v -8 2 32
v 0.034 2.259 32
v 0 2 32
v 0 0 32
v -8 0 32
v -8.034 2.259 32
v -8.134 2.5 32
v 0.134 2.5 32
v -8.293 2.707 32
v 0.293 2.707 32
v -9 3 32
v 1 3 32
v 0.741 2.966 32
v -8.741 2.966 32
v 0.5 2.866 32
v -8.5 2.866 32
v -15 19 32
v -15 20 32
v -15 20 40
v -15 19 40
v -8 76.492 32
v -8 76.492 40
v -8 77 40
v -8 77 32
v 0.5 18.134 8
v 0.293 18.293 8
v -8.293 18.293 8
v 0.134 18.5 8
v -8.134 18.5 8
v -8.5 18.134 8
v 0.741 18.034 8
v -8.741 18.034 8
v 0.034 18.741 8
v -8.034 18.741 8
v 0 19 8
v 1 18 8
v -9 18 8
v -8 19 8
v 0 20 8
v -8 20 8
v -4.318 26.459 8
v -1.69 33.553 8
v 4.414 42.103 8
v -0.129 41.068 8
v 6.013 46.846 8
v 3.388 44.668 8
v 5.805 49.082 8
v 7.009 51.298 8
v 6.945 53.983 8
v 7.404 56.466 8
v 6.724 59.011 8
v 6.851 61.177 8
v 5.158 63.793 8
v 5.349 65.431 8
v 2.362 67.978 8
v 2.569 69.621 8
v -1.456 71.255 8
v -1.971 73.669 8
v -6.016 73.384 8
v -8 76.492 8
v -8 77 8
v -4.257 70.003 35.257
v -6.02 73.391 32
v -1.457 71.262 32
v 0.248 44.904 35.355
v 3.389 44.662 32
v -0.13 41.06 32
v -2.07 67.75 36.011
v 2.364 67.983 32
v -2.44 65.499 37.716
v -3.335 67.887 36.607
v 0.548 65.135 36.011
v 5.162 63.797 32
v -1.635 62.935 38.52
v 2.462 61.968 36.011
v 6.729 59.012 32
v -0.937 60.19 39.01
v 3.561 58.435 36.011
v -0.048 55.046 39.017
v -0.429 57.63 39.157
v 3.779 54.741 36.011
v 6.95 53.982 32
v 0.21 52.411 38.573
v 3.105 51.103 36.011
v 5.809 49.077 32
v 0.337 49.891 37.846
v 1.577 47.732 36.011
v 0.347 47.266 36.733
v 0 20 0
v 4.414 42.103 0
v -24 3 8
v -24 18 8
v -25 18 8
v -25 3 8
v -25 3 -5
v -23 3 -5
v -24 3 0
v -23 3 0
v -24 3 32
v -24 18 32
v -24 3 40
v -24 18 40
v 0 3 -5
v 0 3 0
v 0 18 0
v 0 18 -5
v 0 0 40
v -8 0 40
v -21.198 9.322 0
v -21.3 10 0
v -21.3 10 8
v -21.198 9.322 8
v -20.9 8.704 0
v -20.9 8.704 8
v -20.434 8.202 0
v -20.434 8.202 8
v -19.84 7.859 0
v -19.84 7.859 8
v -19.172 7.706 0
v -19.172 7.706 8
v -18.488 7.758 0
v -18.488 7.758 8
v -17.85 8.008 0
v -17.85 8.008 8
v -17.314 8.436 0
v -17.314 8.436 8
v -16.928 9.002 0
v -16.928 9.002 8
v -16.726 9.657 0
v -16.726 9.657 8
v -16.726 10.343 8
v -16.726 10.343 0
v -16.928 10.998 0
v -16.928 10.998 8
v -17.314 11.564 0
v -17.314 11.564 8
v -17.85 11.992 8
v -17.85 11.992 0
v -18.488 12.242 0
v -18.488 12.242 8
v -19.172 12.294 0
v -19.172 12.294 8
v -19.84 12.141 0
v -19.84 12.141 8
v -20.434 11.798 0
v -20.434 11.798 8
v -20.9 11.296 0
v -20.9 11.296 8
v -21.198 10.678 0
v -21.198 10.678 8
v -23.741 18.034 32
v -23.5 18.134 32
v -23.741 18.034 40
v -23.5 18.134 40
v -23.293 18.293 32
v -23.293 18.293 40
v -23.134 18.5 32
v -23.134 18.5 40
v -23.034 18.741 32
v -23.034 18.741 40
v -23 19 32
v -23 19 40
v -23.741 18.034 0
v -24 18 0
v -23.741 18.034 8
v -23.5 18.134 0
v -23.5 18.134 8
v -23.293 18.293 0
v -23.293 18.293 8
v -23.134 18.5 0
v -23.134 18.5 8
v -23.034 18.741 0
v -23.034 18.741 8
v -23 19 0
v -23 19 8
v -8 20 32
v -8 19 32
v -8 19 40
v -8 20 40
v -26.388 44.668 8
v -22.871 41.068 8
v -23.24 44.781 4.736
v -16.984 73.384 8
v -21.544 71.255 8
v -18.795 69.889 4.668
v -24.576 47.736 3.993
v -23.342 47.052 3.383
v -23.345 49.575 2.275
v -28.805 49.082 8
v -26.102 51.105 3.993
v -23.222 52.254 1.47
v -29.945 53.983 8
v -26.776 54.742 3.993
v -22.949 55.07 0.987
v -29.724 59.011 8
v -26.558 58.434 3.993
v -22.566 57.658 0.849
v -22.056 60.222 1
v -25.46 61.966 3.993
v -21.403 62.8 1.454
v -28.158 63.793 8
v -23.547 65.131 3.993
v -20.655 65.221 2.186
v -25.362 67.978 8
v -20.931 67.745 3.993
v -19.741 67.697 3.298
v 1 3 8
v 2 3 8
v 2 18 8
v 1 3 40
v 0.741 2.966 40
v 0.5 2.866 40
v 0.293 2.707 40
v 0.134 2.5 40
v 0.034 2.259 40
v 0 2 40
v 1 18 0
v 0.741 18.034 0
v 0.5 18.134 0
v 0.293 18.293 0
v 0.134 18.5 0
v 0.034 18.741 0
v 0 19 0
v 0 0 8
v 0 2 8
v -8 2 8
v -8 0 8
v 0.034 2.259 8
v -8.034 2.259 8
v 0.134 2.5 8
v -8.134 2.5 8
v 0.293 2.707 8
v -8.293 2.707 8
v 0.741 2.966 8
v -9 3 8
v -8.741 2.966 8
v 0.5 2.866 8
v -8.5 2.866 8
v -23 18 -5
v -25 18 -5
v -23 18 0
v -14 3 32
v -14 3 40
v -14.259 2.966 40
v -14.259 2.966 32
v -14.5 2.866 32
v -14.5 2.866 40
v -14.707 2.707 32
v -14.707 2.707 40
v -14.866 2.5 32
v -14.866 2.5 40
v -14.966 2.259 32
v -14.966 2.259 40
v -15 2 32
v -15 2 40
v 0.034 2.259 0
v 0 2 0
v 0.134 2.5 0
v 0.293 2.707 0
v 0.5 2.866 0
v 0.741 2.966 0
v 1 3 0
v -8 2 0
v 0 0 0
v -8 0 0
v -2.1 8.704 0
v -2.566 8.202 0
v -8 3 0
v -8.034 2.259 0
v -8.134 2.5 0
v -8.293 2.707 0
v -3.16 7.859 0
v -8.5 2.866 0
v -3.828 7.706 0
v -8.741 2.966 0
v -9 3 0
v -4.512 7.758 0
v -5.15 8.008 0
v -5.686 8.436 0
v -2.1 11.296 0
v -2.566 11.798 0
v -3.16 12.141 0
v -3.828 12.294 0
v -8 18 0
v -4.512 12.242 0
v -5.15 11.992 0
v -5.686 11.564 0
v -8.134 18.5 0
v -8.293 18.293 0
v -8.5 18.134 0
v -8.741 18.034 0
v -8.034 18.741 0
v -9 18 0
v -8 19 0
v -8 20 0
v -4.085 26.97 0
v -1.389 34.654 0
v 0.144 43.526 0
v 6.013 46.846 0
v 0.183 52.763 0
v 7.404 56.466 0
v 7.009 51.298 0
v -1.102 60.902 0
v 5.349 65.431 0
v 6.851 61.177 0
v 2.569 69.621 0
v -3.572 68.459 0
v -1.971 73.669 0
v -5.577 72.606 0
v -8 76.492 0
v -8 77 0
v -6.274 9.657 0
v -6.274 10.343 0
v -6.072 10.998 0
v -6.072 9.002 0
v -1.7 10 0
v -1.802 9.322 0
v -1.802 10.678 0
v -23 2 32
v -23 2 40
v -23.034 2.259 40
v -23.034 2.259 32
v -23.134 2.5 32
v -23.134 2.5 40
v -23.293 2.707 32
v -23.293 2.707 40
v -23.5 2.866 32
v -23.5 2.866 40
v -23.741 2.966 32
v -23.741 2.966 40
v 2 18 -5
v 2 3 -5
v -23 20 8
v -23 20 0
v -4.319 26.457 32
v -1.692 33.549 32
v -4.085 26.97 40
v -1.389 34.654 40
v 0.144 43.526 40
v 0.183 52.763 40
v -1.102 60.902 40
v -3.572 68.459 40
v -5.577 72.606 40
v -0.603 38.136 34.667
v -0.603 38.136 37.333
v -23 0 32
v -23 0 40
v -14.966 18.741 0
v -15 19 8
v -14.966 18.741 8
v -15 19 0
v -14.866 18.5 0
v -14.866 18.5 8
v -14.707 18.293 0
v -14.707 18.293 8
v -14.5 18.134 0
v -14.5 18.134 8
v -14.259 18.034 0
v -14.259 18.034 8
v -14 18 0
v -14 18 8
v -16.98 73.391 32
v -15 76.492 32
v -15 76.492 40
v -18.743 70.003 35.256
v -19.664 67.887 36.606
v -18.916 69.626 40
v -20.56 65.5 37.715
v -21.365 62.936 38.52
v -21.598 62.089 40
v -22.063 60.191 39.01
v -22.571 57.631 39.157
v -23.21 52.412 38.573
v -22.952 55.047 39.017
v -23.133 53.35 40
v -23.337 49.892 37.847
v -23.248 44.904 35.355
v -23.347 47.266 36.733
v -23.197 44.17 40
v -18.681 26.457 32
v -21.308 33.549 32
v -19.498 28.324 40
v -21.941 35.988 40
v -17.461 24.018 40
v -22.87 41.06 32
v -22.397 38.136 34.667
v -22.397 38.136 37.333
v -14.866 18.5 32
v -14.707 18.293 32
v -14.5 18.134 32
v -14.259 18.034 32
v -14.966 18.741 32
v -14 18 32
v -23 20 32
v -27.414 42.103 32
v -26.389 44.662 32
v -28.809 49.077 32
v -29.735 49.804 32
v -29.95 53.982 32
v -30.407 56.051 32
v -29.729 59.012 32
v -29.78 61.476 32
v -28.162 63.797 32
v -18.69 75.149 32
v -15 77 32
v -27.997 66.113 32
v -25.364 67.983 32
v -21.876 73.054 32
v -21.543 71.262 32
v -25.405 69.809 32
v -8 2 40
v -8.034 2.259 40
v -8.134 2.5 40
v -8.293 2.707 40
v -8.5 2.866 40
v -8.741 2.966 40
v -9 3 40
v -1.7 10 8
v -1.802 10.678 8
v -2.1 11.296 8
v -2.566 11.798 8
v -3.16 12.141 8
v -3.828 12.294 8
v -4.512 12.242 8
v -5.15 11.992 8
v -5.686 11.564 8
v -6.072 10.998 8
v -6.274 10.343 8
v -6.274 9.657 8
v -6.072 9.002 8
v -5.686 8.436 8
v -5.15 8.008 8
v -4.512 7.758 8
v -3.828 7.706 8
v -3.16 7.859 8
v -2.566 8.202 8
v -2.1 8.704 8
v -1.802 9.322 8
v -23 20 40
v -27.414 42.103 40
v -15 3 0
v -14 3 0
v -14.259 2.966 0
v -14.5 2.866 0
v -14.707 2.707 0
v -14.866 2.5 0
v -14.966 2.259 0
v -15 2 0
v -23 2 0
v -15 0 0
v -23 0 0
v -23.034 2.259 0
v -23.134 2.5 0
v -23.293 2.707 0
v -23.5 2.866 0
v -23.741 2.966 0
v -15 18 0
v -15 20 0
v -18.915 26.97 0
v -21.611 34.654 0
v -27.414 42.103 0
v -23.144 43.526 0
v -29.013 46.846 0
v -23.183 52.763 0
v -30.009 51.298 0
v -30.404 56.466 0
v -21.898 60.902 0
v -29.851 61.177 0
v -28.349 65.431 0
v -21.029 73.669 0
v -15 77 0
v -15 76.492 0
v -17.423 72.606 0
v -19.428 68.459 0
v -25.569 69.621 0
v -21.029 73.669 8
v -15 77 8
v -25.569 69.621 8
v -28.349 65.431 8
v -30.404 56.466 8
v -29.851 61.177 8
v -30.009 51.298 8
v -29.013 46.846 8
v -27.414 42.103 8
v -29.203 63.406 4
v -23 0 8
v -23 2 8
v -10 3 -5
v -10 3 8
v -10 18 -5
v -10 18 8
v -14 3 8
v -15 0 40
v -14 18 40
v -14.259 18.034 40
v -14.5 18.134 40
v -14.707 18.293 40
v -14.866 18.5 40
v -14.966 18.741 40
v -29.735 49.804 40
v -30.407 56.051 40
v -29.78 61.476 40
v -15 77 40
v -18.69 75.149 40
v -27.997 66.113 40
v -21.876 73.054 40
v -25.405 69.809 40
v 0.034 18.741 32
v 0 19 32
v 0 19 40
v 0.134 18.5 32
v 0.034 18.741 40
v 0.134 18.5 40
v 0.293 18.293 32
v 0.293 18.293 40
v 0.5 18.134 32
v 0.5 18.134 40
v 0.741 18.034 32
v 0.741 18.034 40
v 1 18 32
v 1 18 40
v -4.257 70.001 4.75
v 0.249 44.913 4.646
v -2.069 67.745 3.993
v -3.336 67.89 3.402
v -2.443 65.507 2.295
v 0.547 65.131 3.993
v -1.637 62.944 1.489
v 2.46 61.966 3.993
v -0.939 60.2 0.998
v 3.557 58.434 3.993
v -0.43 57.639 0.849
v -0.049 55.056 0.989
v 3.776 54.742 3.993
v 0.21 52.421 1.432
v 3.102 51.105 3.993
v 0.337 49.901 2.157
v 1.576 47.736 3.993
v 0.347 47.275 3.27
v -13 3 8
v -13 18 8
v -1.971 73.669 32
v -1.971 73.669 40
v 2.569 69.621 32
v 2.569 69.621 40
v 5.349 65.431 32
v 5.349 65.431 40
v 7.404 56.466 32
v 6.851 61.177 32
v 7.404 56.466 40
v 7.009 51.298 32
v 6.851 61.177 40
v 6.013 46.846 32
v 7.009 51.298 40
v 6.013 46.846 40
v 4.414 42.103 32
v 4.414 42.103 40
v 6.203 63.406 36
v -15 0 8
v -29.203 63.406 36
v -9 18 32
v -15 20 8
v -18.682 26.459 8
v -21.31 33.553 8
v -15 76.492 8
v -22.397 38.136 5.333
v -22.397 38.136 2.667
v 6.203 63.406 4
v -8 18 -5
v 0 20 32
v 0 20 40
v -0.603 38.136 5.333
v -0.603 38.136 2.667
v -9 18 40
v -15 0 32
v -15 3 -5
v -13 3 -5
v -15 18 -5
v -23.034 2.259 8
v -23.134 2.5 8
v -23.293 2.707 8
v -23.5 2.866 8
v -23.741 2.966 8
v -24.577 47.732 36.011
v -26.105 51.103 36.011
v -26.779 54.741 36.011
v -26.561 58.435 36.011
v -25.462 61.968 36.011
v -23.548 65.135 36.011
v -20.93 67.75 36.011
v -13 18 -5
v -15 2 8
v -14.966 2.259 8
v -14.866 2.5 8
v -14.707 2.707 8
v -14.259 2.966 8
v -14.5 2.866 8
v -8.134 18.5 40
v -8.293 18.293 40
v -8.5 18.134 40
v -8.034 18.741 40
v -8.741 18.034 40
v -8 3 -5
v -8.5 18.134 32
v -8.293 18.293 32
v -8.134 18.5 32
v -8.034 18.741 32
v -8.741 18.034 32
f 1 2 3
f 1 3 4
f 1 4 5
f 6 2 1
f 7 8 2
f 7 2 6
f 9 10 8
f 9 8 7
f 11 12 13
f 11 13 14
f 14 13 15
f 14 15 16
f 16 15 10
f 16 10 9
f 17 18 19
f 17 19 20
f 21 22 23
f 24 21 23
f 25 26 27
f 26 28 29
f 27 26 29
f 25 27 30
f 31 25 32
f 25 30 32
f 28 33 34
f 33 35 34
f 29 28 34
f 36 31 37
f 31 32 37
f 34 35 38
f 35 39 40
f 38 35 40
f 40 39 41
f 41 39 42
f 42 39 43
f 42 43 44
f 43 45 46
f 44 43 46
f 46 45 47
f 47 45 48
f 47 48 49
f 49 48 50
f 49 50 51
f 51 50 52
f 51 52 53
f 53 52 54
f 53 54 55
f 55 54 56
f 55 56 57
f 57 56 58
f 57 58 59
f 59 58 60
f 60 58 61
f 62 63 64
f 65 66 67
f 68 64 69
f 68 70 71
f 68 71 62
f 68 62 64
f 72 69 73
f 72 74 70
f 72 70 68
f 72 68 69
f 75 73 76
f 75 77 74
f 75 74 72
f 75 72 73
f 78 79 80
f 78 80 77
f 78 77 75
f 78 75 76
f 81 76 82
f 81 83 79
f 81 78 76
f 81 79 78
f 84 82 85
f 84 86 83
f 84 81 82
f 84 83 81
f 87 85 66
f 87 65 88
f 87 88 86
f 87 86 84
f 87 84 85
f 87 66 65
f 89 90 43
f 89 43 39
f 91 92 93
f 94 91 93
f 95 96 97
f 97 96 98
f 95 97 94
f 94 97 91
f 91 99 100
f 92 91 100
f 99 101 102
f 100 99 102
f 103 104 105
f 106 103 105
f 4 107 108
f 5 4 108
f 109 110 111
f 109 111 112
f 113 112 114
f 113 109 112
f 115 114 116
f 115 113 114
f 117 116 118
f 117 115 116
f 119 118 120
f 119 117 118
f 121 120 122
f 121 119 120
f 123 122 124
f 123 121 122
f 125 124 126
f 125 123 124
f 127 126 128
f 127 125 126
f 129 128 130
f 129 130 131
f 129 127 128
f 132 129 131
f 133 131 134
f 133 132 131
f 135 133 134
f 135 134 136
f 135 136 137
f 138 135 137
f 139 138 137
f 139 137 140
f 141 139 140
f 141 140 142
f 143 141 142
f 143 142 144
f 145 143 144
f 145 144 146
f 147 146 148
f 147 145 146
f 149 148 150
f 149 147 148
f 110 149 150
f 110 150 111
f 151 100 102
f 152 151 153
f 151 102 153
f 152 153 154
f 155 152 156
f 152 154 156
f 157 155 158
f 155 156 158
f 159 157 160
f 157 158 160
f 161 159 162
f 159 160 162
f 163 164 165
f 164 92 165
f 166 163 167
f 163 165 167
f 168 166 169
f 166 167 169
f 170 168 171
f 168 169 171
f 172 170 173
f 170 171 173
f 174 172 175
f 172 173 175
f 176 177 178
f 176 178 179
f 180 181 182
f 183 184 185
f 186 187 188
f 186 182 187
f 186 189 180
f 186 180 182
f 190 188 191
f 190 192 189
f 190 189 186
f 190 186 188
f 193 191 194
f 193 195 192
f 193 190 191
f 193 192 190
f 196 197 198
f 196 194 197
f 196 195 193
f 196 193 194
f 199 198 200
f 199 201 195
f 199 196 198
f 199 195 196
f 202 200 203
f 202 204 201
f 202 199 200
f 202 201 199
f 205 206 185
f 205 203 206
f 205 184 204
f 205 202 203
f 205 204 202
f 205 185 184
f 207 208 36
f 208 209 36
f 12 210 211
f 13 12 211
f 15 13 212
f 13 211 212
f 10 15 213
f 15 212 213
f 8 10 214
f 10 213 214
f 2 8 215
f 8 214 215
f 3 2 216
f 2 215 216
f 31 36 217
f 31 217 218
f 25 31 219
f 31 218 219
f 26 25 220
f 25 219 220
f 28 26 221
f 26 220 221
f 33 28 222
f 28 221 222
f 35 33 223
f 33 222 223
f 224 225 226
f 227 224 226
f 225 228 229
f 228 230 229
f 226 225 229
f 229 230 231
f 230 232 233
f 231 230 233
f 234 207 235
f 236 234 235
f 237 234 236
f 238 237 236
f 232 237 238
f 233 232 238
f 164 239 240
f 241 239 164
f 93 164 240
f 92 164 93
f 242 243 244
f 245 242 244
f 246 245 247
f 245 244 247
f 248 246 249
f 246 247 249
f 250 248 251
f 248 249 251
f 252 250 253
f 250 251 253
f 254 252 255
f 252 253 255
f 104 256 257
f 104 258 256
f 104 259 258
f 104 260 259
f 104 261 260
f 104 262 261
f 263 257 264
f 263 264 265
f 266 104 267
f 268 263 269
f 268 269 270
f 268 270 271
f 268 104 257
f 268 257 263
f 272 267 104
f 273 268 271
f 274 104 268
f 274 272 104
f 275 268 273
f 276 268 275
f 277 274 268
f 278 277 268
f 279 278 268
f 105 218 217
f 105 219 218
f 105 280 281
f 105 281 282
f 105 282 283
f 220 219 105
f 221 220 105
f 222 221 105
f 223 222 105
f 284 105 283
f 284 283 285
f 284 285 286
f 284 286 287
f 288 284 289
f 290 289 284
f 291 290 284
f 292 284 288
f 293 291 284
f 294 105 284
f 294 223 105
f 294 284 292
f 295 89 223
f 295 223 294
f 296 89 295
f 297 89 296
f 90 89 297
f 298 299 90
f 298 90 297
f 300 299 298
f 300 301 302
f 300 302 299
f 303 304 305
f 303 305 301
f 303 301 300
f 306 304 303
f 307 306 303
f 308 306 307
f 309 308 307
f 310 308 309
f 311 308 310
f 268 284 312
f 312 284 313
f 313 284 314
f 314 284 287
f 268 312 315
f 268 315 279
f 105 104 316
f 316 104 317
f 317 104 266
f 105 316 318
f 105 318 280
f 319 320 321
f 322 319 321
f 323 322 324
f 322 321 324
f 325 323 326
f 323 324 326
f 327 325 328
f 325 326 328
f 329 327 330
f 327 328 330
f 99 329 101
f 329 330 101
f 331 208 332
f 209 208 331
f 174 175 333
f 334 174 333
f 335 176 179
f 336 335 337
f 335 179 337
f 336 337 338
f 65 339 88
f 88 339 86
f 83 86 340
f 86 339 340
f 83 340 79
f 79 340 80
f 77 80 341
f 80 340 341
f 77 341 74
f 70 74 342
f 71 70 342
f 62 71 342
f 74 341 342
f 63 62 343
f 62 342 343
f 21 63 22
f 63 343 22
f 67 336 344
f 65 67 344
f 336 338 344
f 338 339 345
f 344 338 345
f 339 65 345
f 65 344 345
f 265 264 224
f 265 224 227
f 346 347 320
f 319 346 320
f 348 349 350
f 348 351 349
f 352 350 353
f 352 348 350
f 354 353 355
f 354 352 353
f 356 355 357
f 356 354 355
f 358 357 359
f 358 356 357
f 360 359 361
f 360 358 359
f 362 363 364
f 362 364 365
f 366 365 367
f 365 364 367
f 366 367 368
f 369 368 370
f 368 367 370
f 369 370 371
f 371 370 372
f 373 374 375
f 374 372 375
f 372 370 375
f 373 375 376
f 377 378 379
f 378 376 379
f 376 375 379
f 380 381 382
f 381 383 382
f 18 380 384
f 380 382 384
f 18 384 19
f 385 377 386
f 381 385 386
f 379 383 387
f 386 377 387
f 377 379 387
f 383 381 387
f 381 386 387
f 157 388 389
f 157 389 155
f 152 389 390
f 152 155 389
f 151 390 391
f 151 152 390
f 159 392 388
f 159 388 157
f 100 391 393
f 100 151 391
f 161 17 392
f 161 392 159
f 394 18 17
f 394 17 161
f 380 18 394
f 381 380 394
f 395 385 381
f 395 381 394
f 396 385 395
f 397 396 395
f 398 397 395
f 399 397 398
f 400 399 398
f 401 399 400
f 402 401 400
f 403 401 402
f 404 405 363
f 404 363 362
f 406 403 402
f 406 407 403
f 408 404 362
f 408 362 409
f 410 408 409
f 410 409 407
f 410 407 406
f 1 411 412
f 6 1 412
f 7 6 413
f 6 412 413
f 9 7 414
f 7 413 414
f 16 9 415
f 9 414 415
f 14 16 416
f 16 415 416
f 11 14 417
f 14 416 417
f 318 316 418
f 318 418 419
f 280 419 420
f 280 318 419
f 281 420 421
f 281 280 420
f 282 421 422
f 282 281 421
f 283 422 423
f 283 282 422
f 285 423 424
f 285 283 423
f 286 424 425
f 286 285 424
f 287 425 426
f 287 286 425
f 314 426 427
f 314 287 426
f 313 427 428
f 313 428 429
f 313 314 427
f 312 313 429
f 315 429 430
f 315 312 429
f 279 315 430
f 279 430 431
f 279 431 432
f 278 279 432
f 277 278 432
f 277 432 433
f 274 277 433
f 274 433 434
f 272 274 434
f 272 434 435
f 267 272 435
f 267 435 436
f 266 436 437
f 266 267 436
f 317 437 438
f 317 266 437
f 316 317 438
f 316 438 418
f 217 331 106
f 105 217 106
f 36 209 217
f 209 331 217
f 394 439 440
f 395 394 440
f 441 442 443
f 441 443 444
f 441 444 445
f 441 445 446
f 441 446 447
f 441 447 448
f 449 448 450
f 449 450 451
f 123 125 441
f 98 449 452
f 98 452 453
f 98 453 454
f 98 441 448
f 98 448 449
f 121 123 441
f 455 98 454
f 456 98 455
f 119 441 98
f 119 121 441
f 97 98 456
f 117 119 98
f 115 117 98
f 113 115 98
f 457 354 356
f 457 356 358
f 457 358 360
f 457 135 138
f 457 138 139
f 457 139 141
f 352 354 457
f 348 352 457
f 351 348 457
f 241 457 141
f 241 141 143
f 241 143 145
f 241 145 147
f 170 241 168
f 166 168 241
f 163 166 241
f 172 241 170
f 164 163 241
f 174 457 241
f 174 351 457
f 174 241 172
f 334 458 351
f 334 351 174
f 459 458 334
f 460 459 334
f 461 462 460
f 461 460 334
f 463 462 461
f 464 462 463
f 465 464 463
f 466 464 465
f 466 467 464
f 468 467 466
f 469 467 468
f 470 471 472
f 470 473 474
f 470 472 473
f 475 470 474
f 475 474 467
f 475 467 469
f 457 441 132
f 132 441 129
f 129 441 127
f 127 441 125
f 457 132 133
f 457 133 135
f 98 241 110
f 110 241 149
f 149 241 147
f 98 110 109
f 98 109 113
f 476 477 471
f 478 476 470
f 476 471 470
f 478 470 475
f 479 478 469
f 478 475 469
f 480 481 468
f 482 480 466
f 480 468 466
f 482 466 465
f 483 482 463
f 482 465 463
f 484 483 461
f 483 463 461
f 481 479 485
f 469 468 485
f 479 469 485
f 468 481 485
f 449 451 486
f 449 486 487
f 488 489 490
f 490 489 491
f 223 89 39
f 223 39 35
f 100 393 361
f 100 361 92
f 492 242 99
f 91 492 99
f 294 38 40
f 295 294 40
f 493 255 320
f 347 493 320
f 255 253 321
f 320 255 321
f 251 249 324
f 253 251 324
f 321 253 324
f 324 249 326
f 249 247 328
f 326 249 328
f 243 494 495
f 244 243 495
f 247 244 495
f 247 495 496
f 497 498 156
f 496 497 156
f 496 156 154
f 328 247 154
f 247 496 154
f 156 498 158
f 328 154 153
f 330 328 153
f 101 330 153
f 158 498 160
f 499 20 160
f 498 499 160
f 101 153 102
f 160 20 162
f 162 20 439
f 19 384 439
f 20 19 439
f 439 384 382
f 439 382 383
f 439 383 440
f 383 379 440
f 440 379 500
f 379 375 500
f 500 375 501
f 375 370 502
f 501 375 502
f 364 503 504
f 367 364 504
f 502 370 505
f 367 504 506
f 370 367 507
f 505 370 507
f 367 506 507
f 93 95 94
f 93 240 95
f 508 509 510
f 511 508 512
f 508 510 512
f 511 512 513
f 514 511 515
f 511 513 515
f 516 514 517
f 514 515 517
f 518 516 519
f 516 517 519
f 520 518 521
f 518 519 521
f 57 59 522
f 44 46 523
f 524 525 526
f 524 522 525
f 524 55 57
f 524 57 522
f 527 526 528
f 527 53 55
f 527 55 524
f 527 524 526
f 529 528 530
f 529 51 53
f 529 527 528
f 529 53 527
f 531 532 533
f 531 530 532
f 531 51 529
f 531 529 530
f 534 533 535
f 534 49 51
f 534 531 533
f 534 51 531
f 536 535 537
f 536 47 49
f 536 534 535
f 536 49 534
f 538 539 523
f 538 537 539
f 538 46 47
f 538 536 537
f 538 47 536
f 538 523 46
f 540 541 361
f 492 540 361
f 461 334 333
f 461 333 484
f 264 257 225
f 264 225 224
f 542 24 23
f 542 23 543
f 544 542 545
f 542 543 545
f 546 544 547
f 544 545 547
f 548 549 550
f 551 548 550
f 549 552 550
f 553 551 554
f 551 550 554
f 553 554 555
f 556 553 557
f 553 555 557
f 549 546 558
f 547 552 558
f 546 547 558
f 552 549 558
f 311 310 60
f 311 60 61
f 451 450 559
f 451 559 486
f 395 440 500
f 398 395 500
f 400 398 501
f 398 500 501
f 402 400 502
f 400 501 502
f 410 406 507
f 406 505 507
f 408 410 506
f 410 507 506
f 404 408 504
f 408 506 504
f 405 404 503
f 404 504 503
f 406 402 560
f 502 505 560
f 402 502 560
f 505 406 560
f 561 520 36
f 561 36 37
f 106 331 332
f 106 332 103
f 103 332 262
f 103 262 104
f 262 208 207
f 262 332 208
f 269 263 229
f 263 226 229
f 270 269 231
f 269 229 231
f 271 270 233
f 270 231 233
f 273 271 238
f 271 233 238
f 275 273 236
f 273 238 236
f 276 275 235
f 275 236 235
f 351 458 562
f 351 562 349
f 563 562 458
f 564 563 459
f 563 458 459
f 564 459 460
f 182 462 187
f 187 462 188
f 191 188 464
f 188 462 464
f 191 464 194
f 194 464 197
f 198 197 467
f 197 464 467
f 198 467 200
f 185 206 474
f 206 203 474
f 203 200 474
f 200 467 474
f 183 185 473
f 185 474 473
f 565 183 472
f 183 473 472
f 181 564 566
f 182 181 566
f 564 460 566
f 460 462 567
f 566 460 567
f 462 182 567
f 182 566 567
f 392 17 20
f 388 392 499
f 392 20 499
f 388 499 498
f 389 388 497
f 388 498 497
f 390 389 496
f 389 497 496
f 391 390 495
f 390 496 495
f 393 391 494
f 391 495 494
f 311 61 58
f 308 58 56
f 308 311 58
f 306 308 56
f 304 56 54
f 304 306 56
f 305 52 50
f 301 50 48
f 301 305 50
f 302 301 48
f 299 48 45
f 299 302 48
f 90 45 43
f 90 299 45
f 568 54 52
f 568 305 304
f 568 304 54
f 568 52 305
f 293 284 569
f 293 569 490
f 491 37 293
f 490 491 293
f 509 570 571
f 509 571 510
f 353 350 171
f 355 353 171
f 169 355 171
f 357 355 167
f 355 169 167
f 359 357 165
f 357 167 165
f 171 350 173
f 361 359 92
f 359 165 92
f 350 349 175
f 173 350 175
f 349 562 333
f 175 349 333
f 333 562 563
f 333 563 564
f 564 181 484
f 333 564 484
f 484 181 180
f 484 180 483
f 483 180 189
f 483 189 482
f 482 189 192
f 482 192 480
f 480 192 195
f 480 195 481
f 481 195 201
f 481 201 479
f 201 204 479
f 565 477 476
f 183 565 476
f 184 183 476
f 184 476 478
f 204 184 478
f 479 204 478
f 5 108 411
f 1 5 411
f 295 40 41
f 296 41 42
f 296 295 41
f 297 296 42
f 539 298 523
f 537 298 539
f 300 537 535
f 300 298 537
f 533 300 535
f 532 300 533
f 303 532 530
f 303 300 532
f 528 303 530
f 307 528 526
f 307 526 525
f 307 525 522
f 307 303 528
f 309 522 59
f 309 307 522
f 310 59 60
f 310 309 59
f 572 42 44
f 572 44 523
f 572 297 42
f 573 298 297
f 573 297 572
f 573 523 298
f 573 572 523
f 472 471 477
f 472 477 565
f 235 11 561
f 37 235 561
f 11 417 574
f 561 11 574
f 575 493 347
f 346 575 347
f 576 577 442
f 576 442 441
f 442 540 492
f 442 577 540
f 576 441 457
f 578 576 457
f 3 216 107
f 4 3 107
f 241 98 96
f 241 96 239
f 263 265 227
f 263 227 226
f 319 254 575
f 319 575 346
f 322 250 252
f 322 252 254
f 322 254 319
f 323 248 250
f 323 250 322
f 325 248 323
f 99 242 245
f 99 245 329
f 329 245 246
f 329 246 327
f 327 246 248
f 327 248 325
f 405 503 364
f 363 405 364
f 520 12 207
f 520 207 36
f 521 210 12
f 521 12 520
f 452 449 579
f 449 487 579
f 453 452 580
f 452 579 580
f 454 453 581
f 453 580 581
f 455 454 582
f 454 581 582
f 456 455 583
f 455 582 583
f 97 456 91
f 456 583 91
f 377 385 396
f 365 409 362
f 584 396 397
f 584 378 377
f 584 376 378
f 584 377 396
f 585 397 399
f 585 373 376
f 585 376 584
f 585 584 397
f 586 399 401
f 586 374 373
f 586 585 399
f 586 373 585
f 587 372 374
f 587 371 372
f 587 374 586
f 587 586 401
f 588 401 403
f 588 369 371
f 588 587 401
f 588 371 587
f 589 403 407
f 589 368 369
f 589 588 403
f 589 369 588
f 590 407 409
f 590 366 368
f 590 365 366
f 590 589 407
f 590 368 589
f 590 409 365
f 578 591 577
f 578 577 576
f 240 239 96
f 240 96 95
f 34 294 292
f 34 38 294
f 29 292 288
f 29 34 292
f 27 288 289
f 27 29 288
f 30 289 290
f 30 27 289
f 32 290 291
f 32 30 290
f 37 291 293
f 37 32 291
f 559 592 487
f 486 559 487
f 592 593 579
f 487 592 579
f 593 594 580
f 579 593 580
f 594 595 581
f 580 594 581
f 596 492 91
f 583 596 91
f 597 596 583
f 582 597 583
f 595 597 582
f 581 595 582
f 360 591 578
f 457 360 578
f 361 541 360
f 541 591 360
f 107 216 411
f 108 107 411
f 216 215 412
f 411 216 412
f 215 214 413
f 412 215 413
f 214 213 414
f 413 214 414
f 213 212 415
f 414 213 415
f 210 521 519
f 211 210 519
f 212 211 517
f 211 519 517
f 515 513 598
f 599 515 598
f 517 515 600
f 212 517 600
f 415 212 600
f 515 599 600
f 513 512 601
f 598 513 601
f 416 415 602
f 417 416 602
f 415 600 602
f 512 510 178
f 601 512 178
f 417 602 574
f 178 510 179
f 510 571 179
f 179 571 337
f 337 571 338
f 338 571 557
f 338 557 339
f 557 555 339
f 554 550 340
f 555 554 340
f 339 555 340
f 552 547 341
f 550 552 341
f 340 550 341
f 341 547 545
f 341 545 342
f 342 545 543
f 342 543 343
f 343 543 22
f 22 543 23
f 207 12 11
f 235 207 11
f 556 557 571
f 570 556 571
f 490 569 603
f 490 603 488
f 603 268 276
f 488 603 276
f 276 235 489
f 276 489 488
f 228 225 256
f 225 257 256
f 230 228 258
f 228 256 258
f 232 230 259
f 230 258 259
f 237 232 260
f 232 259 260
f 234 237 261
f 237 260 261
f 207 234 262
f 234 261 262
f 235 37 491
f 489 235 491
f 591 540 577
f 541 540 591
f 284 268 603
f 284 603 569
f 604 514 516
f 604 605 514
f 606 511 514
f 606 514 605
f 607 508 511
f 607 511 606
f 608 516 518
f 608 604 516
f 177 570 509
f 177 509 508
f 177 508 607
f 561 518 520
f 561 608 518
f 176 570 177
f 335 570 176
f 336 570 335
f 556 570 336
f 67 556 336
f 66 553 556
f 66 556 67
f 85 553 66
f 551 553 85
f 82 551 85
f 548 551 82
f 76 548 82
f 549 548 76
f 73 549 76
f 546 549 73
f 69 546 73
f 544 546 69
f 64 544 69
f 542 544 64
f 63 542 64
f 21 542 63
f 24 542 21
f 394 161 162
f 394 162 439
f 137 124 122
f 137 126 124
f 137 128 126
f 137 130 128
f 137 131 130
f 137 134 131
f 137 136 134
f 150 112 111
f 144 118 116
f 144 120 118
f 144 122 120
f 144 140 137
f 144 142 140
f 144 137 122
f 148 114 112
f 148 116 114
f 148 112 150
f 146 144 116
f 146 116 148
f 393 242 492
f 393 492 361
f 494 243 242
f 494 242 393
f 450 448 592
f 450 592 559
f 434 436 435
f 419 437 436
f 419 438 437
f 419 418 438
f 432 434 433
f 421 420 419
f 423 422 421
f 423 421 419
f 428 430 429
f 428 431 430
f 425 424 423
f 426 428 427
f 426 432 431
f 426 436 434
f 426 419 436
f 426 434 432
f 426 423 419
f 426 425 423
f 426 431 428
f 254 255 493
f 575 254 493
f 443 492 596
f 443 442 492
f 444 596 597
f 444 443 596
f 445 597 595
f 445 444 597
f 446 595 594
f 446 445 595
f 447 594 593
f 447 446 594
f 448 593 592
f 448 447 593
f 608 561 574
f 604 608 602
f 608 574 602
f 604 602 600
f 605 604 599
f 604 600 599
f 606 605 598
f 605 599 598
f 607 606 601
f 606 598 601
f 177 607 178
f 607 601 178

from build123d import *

# Parameters (mm, degrees)
SKETCH_1_R         = 2.3
EXTRUDE_1_DEPTH    = 8
EXTRUDE_1_2_DEPTH  = 8
SKETCH_2_W         = 8
SKETCH_2_H         = 15
EXTRUDE_2_DEPTH    = 2
SKETCH_3_W         = 2
SKETCH_3_H         = 15
EXTRUDE_3_DEPTH    = 5
SKETCH_4_W         = 8
SKETCH_4_H         = 15
EXTRUDE_4_DEPTH    = 2
SKETCH_5_W         = 2
SKETCH_5_H         = 15
EXTRUDE_5_DEPTH    = 5
FILLET_1_R         = 1
SKETCH_7_W         = 8
SKETCH_7_H         = 15
EXTRUDE_6_DEPTH    = 2
SKETCH_8_W         = 8
SKETCH_8_H         = 15
EXTRUDE_7_DEPTH    = 2
SKETCH_9_W         = 2
SKETCH_9_H         = 15
EXTRUDE_8_DEPTH    = 5
FILLET_2_R         = 1
EXTRUDE_10_DEPTH   = 8
EXTRUDE_10_2_DEPTH = 8
SKETCH_22_W        = 10
SKETCH_22_H        = 15
EXTRUDE_12_DEPTH   = 24


with BuildPart() as part:
    # 草图1 → 凸台-拉伸1 (new body)
    with BuildSketch(Plane.XY):
        with BuildLine():
            Line((-8, 0), (-8, 20))
            add(Edge.make_bspline(
                [(-8, 20), (2.997717423, 35.871381499), (3.288906564, 60.453592805), (-8, 76.491759263)],
                knots=[0, 0, 0, 0, 0.972662297, 0.972662297, 0.972662297, 0.972662297], degree=3))
            Line((-8, 76.491759263), (-8, 77))
            add(Edge.make_bspline(
                [(-8, 77), (14.198398274, 67.260824221), (4.413603164, 42.103141077)],
                knots=[0, 0, 0, 1, 1, 1], degree=2))
            Line((4.413603164, 42.103141077), (0, 20))
            Line((0, 20), (0, 0))
            Line((0, 0), (-8, 0))
        make_face()
        with Locations((-4, 10)):
            Circle(SKETCH_1_R, mode=Mode.SUBTRACT)
    extrude(amount=EXTRUDE_1_DEPTH)

    # 草图2 → 凸台-拉伸2 (add)
    with BuildSketch(Plane(origin=(0, 0, 0), x_dir=(0, 0, -1), z_dir=(1, 0, 0))):
        with Locations((-4, 10.5)):
            Rectangle(SKETCH_2_W, SKETCH_2_H)
    extrude(amount=EXTRUDE_2_DEPTH)

    # 草图3 → 凸台-拉伸3 (add)
    with BuildSketch(Plane(origin=(0, 0, 0), x_dir=(-1, 0, 0), z_dir=(0, 0, -1))):
        with Locations((-1, 10.5)):
            Rectangle(SKETCH_3_W, SKETCH_3_H)
    extrude(amount=EXTRUDE_3_DEPTH)

    # 草图4 → 凸台-拉伸4 (add)
    with BuildSketch(Plane.ZY.offset(8)):
        with Locations((4, 10.5)):
            Rectangle(SKETCH_4_W, SKETCH_4_H)
    extrude(amount=EXTRUDE_4_DEPTH)

    # 草图5 → 凸台-拉伸5 (add)
    with BuildSketch(Plane(origin=(0, 0, 0), x_dir=(-1, 0, 0), z_dir=(0, 0, -1))):
        with Locations((9, 10.5)):
            Rectangle(SKETCH_5_W, SKETCH_5_H)
    extrude(amount=EXTRUDE_5_DEPTH)

    # 圆角1
    fillet_1_edges = [part.edges().sort_by_distance(p)[0] for p in [
        (0, 3, 4),
        (0, 18, 4),
        (-8, 3, 4),
        (-8, 18, 4),
    ]]
    fillet(fillet_1_edges, radius=FILLET_1_R)


with BuildPart() as body_2:
    # 草图1 → Extrude 1 2 (new body)
    with BuildSketch(Plane.XY):
        with BuildLine():
            Line((-15, 77), (-15, 76.491759263))
            add(Edge.make_bspline(
                [(-15, 20), (-25.997717423, 35.871381499), (-26.288906564, 60.453592805), (-15, 76.491759263)],
                knots=[0, 0, 0, 0, 0.972662297, 0.972662297, 0.972662297, 0.972662297], degree=3))
            Line((-15, 20), (-15, 0))
            Line((-15, 0), (-23, 0))
            Line((-23, 0), (-23, 20))
            Line((-23, 20), (-27.413603164, 42.103141077))
            add(Edge.make_bspline(
                [(-15, 77), (-37.198398274, 67.260824221), (-27.413603164, 42.103141077)],
                knots=[0, 0, 0, 1, 1, 1], degree=2))
        make_face()
        with Locations(Location((-19, 10, 0), (0, 0, 180))):
            Circle(SKETCH_1_R, mode=Mode.SUBTRACT)
    extrude(amount=EXTRUDE_1_2_DEPTH)

    # 草图7 → 凸台-拉伸6 (add)
    with BuildSketch(Plane(origin=(-15, 0, 0), x_dir=(0, 0, -1), z_dir=(1, 0, 0))):
        with Locations((-4, 10.5)):
            Rectangle(SKETCH_7_W, SKETCH_7_H)
    extrude(amount=EXTRUDE_6_DEPTH)

    # 草图8 → 凸台-拉伸7 (add)
    with BuildSketch(Plane.ZY.offset(23)):
        with Locations((4, 10.5)):
            Rectangle(SKETCH_8_W, SKETCH_8_H)
    extrude(amount=EXTRUDE_7_DEPTH)

    # 草图9 → 凸台-拉伸8 (add)
    with BuildSketch(Plane(origin=(0, 0, 0), x_dir=(-1, 0, 0), z_dir=(0, 0, -1))):
        with Locations((14, 10.5)):
            Rectangle(SKETCH_9_W, SKETCH_9_H)
        with Locations((24, 10.5)):
            Rectangle(SKETCH_9_W, SKETCH_9_H)
    extrude(amount=EXTRUDE_8_DEPTH)

    # 圆角2
    fillet_2_edges = [body_2.edges().sort_by_distance(p)[0] for p in [
        (-15, 3, 4),
        (-15, 18, 4),
        (-23, 3, 4),
        (-23, 18, 4),
    ]]
    fillet(fillet_2_edges, radius=FILLET_2_R)


with BuildPart() as body_3:
    # 草图18 → 凸台-拉伸10 (new body)
    with BuildSketch(Plane(origin=(0, 0, 40), x_dir=(-1, 0, 0), z_dir=(0, 0, -1))):
        with BuildLine():
            Line((8, 19), (8, 20))
            add(Edge.make_bspline(
                [(8, 20), (-2.997717423, 35.871381499), (-3.288906564, 60.453592805), (8, 76.491759263)],
                knots=[0, 0, 0, 0, 0.972662297, 0.972662297, 0.972662297, 0.972662297], degree=3))
            Line((8, 76.491759263), (8, 77))
            add(Edge.make_bspline(
                [(8, 77), (-14.198398274, 67.260824221), (-4.413603164, 42.103141077)],
                knots=[0, 0, 0, 1, 1, 1], degree=2))
            Line((-4.413603164, 42.103141077), (0, 20))
            Line((0, 20), (0, 19))
            ThreePointArc((0, 19), (-0.292893219, 18.292893219), (-1, 18))
            Line((-1, 18), (-1, 3))
            ThreePointArc((-1, 3), (-0.292893219, 2.707106781), (0, 2))
            Line((0, 2), (0, 0))
            Line((0, 0), (8, 0))
            Line((8, 0), (8, 2))
            ThreePointArc((8, 2), (8.292893219, 2.707106781), (9, 3))
            Line((9, 3), (9, 18))
            ThreePointArc((9, 18), (8.292893219, 18.292893219), (8, 19))
        make_face()
    extrude(amount=EXTRUDE_10_DEPTH)


with BuildPart() as body_4:
    # 草图18 → Extrude 10 2 (new body)
    with BuildSketch(Plane(origin=(0, 0, 40), x_dir=(-1, 0, 0), z_dir=(0, 0, -1))):
        with BuildLine():
            Line((23, 0), (23, 2))
            ThreePointArc((23, 2), (23.292893219, 2.707106781), (24, 3))
            Line((24, 3), (24, 18))
            ThreePointArc((24, 18), (23.292893219, 18.292893219), (23, 19))
            Line((23, 19), (23, 20))
            Line((23, 20), (27.413603164, 42.103141077))
            add(Edge.make_bspline(
                [(27.413603164, 42.103141077), (37.198398274, 67.260824221), (15, 77)],
                knots=[0, 0, 0, 1, 1, 1], degree=2))
            Line((15, 77), (15, 76.491759263))
            add(Edge.make_bspline(
                [(15, 76.491759263), (26.288906564, 60.453592805), (25.997717423, 35.871381499), (15, 20)],
                knots=[0, 0, 0, 0, 0.972662297, 0.972662297, 0.972662297, 0.972662297], degree=3))
            Line((15, 20), (15, 19))
            ThreePointArc((15, 19), (14.707106781, 18.292893219), (14, 18))
            Line((14, 18), (14, 3))
            ThreePointArc((14, 3), (14.707106781, 2.707106781), (15, 2))
            Line((15, 2), (15, 0))
            Line((15, 0), (23, 0))
        make_face()
    extrude(amount=EXTRUDE_10_2_DEPTH)


with BuildPart() as cut_revolve_1_tool:
    # 草图13 → 切除-旋转1 (revolve)
    with BuildSketch(Plane(origin=(-11.5, 55.690543417, 8), x_dir=(1, 0, 0), z_dir=(0, 1, 0))):
        with BuildLine():
            Line((0, -33.432937933), (0, 10.26347139))
            ThreePointArc((0, 10.26347139), (-15.579514295, 3.732667985), (-21.84506009, -11.955403748))
            ThreePointArc((-21.84506009, -11.955403748), (-15.613678748, -27.705141018), (0, -34.27))
            Line((0, -34.27), (0, -33.432937933))
        make_face()
    revolve(axis=Axis((-11.5, 55.690543417, 1008), (0, 0, -1)))


with BuildPart() as part_1:
    add(part.part)

    # 切除-旋转1: cut by cut_revolve_1_tool
    add(cut_revolve_1_tool.part, mode=Mode.SUBTRACT)



with BuildPart() as body_2_1:
    add(body_2.part)

    # 切除-旋转1: cut by cut_revolve_1_tool
    add(cut_revolve_1_tool.part, mode=Mode.SUBTRACT)


with BuildPart() as body_3_1:
    add(body_3.part)

    # 切除-旋转1: cut by cut_revolve_1_tool
    add(cut_revolve_1_tool.part, mode=Mode.SUBTRACT)


with BuildPart() as body_4_1:
    add(body_4.part)

    # 切除-旋转1: cut by cut_revolve_1_tool
    add(cut_revolve_1_tool.part, mode=Mode.SUBTRACT)


with BuildPart() as part_2:
    add(part_1.part)

    add(body_2_1.part)  # 凸台-拉伸12 merges body 2

    add(body_3_1.part)  # 凸台-拉伸12 merges body 3

    add(body_4_1.part)  # 凸台-拉伸12 merges body 4
    # 草图22 → 凸台-拉伸12 (add)
    with BuildSketch(Plane(origin=(0, 0, 32), x_dir=(-1, 0, 0), z_dir=(0, 0, -1))):
        with Locations((19, 10.5)):
            Rectangle(SKETCH_22_W, SKETCH_22_H)
        with Locations((4, 10.5)):
            Rectangle(SKETCH_22_W, SKETCH_22_H)
    extrude(amount=EXTRUDE_12_DEPTH)


solid = part_2.part
